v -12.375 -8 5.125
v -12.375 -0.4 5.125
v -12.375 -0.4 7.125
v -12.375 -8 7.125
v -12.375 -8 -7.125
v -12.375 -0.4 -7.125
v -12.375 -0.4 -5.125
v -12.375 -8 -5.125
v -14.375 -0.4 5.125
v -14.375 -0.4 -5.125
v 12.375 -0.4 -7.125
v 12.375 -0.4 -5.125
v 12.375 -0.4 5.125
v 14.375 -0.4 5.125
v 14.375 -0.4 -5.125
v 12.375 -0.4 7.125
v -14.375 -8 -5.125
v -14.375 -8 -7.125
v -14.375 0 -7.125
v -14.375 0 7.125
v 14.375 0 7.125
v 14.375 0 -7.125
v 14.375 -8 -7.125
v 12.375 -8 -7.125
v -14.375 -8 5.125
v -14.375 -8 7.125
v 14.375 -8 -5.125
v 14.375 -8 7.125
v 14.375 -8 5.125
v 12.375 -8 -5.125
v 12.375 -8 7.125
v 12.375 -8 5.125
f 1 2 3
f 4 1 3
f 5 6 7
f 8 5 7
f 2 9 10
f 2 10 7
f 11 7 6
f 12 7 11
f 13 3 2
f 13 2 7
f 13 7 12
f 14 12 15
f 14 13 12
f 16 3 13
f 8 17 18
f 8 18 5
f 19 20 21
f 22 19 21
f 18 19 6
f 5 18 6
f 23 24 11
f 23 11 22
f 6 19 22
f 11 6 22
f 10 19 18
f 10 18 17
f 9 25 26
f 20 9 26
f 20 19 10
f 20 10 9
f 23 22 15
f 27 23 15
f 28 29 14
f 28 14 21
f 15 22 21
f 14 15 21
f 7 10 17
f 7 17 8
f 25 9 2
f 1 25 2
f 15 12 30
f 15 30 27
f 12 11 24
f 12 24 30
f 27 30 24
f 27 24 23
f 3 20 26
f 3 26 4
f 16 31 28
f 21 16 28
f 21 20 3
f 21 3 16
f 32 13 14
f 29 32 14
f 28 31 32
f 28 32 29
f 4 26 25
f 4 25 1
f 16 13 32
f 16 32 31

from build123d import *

# Parameters (mm, degrees)
F1_DEPTH = 0.4
F0_W     = 2
F0_H     = 2
F2_DEPTH = 8


with BuildPart() as f1:
    # F0 (on Front) → F1 (new body)
    with BuildSketch(Plane.XZ):
        Polygon((12.375, 5.125), (12.375, 7.125), (-12.375, 7.125), (-12.375, 5.125), (-14.375, 5.125), (-14.375, -5.125), (-12.375, -5.125), (-12.375, -7.125), (12.375, -7.125), (12.375, -5.125), (14.375, -5.125), (14.375, 5.125), align=None)
    extrude(amount=F1_DEPTH)

    # F0 (on Front) → F2 (join)
    with BuildSketch(Plane.XZ):
        with Locations((-13.375, 6.125)):
            Rectangle(F0_W, F0_H)
        with Locations((-13.375, -6.125)):
            Rectangle(F0_W, F0_H)
        with Locations((13.375, -6.125)):
            Rectangle(F0_W, F0_H)
        with Locations((13.375, 6.125)):
            Rectangle(F0_W, F0_H)
    extrude(amount=F2_DEPTH)


solid = f1.part
